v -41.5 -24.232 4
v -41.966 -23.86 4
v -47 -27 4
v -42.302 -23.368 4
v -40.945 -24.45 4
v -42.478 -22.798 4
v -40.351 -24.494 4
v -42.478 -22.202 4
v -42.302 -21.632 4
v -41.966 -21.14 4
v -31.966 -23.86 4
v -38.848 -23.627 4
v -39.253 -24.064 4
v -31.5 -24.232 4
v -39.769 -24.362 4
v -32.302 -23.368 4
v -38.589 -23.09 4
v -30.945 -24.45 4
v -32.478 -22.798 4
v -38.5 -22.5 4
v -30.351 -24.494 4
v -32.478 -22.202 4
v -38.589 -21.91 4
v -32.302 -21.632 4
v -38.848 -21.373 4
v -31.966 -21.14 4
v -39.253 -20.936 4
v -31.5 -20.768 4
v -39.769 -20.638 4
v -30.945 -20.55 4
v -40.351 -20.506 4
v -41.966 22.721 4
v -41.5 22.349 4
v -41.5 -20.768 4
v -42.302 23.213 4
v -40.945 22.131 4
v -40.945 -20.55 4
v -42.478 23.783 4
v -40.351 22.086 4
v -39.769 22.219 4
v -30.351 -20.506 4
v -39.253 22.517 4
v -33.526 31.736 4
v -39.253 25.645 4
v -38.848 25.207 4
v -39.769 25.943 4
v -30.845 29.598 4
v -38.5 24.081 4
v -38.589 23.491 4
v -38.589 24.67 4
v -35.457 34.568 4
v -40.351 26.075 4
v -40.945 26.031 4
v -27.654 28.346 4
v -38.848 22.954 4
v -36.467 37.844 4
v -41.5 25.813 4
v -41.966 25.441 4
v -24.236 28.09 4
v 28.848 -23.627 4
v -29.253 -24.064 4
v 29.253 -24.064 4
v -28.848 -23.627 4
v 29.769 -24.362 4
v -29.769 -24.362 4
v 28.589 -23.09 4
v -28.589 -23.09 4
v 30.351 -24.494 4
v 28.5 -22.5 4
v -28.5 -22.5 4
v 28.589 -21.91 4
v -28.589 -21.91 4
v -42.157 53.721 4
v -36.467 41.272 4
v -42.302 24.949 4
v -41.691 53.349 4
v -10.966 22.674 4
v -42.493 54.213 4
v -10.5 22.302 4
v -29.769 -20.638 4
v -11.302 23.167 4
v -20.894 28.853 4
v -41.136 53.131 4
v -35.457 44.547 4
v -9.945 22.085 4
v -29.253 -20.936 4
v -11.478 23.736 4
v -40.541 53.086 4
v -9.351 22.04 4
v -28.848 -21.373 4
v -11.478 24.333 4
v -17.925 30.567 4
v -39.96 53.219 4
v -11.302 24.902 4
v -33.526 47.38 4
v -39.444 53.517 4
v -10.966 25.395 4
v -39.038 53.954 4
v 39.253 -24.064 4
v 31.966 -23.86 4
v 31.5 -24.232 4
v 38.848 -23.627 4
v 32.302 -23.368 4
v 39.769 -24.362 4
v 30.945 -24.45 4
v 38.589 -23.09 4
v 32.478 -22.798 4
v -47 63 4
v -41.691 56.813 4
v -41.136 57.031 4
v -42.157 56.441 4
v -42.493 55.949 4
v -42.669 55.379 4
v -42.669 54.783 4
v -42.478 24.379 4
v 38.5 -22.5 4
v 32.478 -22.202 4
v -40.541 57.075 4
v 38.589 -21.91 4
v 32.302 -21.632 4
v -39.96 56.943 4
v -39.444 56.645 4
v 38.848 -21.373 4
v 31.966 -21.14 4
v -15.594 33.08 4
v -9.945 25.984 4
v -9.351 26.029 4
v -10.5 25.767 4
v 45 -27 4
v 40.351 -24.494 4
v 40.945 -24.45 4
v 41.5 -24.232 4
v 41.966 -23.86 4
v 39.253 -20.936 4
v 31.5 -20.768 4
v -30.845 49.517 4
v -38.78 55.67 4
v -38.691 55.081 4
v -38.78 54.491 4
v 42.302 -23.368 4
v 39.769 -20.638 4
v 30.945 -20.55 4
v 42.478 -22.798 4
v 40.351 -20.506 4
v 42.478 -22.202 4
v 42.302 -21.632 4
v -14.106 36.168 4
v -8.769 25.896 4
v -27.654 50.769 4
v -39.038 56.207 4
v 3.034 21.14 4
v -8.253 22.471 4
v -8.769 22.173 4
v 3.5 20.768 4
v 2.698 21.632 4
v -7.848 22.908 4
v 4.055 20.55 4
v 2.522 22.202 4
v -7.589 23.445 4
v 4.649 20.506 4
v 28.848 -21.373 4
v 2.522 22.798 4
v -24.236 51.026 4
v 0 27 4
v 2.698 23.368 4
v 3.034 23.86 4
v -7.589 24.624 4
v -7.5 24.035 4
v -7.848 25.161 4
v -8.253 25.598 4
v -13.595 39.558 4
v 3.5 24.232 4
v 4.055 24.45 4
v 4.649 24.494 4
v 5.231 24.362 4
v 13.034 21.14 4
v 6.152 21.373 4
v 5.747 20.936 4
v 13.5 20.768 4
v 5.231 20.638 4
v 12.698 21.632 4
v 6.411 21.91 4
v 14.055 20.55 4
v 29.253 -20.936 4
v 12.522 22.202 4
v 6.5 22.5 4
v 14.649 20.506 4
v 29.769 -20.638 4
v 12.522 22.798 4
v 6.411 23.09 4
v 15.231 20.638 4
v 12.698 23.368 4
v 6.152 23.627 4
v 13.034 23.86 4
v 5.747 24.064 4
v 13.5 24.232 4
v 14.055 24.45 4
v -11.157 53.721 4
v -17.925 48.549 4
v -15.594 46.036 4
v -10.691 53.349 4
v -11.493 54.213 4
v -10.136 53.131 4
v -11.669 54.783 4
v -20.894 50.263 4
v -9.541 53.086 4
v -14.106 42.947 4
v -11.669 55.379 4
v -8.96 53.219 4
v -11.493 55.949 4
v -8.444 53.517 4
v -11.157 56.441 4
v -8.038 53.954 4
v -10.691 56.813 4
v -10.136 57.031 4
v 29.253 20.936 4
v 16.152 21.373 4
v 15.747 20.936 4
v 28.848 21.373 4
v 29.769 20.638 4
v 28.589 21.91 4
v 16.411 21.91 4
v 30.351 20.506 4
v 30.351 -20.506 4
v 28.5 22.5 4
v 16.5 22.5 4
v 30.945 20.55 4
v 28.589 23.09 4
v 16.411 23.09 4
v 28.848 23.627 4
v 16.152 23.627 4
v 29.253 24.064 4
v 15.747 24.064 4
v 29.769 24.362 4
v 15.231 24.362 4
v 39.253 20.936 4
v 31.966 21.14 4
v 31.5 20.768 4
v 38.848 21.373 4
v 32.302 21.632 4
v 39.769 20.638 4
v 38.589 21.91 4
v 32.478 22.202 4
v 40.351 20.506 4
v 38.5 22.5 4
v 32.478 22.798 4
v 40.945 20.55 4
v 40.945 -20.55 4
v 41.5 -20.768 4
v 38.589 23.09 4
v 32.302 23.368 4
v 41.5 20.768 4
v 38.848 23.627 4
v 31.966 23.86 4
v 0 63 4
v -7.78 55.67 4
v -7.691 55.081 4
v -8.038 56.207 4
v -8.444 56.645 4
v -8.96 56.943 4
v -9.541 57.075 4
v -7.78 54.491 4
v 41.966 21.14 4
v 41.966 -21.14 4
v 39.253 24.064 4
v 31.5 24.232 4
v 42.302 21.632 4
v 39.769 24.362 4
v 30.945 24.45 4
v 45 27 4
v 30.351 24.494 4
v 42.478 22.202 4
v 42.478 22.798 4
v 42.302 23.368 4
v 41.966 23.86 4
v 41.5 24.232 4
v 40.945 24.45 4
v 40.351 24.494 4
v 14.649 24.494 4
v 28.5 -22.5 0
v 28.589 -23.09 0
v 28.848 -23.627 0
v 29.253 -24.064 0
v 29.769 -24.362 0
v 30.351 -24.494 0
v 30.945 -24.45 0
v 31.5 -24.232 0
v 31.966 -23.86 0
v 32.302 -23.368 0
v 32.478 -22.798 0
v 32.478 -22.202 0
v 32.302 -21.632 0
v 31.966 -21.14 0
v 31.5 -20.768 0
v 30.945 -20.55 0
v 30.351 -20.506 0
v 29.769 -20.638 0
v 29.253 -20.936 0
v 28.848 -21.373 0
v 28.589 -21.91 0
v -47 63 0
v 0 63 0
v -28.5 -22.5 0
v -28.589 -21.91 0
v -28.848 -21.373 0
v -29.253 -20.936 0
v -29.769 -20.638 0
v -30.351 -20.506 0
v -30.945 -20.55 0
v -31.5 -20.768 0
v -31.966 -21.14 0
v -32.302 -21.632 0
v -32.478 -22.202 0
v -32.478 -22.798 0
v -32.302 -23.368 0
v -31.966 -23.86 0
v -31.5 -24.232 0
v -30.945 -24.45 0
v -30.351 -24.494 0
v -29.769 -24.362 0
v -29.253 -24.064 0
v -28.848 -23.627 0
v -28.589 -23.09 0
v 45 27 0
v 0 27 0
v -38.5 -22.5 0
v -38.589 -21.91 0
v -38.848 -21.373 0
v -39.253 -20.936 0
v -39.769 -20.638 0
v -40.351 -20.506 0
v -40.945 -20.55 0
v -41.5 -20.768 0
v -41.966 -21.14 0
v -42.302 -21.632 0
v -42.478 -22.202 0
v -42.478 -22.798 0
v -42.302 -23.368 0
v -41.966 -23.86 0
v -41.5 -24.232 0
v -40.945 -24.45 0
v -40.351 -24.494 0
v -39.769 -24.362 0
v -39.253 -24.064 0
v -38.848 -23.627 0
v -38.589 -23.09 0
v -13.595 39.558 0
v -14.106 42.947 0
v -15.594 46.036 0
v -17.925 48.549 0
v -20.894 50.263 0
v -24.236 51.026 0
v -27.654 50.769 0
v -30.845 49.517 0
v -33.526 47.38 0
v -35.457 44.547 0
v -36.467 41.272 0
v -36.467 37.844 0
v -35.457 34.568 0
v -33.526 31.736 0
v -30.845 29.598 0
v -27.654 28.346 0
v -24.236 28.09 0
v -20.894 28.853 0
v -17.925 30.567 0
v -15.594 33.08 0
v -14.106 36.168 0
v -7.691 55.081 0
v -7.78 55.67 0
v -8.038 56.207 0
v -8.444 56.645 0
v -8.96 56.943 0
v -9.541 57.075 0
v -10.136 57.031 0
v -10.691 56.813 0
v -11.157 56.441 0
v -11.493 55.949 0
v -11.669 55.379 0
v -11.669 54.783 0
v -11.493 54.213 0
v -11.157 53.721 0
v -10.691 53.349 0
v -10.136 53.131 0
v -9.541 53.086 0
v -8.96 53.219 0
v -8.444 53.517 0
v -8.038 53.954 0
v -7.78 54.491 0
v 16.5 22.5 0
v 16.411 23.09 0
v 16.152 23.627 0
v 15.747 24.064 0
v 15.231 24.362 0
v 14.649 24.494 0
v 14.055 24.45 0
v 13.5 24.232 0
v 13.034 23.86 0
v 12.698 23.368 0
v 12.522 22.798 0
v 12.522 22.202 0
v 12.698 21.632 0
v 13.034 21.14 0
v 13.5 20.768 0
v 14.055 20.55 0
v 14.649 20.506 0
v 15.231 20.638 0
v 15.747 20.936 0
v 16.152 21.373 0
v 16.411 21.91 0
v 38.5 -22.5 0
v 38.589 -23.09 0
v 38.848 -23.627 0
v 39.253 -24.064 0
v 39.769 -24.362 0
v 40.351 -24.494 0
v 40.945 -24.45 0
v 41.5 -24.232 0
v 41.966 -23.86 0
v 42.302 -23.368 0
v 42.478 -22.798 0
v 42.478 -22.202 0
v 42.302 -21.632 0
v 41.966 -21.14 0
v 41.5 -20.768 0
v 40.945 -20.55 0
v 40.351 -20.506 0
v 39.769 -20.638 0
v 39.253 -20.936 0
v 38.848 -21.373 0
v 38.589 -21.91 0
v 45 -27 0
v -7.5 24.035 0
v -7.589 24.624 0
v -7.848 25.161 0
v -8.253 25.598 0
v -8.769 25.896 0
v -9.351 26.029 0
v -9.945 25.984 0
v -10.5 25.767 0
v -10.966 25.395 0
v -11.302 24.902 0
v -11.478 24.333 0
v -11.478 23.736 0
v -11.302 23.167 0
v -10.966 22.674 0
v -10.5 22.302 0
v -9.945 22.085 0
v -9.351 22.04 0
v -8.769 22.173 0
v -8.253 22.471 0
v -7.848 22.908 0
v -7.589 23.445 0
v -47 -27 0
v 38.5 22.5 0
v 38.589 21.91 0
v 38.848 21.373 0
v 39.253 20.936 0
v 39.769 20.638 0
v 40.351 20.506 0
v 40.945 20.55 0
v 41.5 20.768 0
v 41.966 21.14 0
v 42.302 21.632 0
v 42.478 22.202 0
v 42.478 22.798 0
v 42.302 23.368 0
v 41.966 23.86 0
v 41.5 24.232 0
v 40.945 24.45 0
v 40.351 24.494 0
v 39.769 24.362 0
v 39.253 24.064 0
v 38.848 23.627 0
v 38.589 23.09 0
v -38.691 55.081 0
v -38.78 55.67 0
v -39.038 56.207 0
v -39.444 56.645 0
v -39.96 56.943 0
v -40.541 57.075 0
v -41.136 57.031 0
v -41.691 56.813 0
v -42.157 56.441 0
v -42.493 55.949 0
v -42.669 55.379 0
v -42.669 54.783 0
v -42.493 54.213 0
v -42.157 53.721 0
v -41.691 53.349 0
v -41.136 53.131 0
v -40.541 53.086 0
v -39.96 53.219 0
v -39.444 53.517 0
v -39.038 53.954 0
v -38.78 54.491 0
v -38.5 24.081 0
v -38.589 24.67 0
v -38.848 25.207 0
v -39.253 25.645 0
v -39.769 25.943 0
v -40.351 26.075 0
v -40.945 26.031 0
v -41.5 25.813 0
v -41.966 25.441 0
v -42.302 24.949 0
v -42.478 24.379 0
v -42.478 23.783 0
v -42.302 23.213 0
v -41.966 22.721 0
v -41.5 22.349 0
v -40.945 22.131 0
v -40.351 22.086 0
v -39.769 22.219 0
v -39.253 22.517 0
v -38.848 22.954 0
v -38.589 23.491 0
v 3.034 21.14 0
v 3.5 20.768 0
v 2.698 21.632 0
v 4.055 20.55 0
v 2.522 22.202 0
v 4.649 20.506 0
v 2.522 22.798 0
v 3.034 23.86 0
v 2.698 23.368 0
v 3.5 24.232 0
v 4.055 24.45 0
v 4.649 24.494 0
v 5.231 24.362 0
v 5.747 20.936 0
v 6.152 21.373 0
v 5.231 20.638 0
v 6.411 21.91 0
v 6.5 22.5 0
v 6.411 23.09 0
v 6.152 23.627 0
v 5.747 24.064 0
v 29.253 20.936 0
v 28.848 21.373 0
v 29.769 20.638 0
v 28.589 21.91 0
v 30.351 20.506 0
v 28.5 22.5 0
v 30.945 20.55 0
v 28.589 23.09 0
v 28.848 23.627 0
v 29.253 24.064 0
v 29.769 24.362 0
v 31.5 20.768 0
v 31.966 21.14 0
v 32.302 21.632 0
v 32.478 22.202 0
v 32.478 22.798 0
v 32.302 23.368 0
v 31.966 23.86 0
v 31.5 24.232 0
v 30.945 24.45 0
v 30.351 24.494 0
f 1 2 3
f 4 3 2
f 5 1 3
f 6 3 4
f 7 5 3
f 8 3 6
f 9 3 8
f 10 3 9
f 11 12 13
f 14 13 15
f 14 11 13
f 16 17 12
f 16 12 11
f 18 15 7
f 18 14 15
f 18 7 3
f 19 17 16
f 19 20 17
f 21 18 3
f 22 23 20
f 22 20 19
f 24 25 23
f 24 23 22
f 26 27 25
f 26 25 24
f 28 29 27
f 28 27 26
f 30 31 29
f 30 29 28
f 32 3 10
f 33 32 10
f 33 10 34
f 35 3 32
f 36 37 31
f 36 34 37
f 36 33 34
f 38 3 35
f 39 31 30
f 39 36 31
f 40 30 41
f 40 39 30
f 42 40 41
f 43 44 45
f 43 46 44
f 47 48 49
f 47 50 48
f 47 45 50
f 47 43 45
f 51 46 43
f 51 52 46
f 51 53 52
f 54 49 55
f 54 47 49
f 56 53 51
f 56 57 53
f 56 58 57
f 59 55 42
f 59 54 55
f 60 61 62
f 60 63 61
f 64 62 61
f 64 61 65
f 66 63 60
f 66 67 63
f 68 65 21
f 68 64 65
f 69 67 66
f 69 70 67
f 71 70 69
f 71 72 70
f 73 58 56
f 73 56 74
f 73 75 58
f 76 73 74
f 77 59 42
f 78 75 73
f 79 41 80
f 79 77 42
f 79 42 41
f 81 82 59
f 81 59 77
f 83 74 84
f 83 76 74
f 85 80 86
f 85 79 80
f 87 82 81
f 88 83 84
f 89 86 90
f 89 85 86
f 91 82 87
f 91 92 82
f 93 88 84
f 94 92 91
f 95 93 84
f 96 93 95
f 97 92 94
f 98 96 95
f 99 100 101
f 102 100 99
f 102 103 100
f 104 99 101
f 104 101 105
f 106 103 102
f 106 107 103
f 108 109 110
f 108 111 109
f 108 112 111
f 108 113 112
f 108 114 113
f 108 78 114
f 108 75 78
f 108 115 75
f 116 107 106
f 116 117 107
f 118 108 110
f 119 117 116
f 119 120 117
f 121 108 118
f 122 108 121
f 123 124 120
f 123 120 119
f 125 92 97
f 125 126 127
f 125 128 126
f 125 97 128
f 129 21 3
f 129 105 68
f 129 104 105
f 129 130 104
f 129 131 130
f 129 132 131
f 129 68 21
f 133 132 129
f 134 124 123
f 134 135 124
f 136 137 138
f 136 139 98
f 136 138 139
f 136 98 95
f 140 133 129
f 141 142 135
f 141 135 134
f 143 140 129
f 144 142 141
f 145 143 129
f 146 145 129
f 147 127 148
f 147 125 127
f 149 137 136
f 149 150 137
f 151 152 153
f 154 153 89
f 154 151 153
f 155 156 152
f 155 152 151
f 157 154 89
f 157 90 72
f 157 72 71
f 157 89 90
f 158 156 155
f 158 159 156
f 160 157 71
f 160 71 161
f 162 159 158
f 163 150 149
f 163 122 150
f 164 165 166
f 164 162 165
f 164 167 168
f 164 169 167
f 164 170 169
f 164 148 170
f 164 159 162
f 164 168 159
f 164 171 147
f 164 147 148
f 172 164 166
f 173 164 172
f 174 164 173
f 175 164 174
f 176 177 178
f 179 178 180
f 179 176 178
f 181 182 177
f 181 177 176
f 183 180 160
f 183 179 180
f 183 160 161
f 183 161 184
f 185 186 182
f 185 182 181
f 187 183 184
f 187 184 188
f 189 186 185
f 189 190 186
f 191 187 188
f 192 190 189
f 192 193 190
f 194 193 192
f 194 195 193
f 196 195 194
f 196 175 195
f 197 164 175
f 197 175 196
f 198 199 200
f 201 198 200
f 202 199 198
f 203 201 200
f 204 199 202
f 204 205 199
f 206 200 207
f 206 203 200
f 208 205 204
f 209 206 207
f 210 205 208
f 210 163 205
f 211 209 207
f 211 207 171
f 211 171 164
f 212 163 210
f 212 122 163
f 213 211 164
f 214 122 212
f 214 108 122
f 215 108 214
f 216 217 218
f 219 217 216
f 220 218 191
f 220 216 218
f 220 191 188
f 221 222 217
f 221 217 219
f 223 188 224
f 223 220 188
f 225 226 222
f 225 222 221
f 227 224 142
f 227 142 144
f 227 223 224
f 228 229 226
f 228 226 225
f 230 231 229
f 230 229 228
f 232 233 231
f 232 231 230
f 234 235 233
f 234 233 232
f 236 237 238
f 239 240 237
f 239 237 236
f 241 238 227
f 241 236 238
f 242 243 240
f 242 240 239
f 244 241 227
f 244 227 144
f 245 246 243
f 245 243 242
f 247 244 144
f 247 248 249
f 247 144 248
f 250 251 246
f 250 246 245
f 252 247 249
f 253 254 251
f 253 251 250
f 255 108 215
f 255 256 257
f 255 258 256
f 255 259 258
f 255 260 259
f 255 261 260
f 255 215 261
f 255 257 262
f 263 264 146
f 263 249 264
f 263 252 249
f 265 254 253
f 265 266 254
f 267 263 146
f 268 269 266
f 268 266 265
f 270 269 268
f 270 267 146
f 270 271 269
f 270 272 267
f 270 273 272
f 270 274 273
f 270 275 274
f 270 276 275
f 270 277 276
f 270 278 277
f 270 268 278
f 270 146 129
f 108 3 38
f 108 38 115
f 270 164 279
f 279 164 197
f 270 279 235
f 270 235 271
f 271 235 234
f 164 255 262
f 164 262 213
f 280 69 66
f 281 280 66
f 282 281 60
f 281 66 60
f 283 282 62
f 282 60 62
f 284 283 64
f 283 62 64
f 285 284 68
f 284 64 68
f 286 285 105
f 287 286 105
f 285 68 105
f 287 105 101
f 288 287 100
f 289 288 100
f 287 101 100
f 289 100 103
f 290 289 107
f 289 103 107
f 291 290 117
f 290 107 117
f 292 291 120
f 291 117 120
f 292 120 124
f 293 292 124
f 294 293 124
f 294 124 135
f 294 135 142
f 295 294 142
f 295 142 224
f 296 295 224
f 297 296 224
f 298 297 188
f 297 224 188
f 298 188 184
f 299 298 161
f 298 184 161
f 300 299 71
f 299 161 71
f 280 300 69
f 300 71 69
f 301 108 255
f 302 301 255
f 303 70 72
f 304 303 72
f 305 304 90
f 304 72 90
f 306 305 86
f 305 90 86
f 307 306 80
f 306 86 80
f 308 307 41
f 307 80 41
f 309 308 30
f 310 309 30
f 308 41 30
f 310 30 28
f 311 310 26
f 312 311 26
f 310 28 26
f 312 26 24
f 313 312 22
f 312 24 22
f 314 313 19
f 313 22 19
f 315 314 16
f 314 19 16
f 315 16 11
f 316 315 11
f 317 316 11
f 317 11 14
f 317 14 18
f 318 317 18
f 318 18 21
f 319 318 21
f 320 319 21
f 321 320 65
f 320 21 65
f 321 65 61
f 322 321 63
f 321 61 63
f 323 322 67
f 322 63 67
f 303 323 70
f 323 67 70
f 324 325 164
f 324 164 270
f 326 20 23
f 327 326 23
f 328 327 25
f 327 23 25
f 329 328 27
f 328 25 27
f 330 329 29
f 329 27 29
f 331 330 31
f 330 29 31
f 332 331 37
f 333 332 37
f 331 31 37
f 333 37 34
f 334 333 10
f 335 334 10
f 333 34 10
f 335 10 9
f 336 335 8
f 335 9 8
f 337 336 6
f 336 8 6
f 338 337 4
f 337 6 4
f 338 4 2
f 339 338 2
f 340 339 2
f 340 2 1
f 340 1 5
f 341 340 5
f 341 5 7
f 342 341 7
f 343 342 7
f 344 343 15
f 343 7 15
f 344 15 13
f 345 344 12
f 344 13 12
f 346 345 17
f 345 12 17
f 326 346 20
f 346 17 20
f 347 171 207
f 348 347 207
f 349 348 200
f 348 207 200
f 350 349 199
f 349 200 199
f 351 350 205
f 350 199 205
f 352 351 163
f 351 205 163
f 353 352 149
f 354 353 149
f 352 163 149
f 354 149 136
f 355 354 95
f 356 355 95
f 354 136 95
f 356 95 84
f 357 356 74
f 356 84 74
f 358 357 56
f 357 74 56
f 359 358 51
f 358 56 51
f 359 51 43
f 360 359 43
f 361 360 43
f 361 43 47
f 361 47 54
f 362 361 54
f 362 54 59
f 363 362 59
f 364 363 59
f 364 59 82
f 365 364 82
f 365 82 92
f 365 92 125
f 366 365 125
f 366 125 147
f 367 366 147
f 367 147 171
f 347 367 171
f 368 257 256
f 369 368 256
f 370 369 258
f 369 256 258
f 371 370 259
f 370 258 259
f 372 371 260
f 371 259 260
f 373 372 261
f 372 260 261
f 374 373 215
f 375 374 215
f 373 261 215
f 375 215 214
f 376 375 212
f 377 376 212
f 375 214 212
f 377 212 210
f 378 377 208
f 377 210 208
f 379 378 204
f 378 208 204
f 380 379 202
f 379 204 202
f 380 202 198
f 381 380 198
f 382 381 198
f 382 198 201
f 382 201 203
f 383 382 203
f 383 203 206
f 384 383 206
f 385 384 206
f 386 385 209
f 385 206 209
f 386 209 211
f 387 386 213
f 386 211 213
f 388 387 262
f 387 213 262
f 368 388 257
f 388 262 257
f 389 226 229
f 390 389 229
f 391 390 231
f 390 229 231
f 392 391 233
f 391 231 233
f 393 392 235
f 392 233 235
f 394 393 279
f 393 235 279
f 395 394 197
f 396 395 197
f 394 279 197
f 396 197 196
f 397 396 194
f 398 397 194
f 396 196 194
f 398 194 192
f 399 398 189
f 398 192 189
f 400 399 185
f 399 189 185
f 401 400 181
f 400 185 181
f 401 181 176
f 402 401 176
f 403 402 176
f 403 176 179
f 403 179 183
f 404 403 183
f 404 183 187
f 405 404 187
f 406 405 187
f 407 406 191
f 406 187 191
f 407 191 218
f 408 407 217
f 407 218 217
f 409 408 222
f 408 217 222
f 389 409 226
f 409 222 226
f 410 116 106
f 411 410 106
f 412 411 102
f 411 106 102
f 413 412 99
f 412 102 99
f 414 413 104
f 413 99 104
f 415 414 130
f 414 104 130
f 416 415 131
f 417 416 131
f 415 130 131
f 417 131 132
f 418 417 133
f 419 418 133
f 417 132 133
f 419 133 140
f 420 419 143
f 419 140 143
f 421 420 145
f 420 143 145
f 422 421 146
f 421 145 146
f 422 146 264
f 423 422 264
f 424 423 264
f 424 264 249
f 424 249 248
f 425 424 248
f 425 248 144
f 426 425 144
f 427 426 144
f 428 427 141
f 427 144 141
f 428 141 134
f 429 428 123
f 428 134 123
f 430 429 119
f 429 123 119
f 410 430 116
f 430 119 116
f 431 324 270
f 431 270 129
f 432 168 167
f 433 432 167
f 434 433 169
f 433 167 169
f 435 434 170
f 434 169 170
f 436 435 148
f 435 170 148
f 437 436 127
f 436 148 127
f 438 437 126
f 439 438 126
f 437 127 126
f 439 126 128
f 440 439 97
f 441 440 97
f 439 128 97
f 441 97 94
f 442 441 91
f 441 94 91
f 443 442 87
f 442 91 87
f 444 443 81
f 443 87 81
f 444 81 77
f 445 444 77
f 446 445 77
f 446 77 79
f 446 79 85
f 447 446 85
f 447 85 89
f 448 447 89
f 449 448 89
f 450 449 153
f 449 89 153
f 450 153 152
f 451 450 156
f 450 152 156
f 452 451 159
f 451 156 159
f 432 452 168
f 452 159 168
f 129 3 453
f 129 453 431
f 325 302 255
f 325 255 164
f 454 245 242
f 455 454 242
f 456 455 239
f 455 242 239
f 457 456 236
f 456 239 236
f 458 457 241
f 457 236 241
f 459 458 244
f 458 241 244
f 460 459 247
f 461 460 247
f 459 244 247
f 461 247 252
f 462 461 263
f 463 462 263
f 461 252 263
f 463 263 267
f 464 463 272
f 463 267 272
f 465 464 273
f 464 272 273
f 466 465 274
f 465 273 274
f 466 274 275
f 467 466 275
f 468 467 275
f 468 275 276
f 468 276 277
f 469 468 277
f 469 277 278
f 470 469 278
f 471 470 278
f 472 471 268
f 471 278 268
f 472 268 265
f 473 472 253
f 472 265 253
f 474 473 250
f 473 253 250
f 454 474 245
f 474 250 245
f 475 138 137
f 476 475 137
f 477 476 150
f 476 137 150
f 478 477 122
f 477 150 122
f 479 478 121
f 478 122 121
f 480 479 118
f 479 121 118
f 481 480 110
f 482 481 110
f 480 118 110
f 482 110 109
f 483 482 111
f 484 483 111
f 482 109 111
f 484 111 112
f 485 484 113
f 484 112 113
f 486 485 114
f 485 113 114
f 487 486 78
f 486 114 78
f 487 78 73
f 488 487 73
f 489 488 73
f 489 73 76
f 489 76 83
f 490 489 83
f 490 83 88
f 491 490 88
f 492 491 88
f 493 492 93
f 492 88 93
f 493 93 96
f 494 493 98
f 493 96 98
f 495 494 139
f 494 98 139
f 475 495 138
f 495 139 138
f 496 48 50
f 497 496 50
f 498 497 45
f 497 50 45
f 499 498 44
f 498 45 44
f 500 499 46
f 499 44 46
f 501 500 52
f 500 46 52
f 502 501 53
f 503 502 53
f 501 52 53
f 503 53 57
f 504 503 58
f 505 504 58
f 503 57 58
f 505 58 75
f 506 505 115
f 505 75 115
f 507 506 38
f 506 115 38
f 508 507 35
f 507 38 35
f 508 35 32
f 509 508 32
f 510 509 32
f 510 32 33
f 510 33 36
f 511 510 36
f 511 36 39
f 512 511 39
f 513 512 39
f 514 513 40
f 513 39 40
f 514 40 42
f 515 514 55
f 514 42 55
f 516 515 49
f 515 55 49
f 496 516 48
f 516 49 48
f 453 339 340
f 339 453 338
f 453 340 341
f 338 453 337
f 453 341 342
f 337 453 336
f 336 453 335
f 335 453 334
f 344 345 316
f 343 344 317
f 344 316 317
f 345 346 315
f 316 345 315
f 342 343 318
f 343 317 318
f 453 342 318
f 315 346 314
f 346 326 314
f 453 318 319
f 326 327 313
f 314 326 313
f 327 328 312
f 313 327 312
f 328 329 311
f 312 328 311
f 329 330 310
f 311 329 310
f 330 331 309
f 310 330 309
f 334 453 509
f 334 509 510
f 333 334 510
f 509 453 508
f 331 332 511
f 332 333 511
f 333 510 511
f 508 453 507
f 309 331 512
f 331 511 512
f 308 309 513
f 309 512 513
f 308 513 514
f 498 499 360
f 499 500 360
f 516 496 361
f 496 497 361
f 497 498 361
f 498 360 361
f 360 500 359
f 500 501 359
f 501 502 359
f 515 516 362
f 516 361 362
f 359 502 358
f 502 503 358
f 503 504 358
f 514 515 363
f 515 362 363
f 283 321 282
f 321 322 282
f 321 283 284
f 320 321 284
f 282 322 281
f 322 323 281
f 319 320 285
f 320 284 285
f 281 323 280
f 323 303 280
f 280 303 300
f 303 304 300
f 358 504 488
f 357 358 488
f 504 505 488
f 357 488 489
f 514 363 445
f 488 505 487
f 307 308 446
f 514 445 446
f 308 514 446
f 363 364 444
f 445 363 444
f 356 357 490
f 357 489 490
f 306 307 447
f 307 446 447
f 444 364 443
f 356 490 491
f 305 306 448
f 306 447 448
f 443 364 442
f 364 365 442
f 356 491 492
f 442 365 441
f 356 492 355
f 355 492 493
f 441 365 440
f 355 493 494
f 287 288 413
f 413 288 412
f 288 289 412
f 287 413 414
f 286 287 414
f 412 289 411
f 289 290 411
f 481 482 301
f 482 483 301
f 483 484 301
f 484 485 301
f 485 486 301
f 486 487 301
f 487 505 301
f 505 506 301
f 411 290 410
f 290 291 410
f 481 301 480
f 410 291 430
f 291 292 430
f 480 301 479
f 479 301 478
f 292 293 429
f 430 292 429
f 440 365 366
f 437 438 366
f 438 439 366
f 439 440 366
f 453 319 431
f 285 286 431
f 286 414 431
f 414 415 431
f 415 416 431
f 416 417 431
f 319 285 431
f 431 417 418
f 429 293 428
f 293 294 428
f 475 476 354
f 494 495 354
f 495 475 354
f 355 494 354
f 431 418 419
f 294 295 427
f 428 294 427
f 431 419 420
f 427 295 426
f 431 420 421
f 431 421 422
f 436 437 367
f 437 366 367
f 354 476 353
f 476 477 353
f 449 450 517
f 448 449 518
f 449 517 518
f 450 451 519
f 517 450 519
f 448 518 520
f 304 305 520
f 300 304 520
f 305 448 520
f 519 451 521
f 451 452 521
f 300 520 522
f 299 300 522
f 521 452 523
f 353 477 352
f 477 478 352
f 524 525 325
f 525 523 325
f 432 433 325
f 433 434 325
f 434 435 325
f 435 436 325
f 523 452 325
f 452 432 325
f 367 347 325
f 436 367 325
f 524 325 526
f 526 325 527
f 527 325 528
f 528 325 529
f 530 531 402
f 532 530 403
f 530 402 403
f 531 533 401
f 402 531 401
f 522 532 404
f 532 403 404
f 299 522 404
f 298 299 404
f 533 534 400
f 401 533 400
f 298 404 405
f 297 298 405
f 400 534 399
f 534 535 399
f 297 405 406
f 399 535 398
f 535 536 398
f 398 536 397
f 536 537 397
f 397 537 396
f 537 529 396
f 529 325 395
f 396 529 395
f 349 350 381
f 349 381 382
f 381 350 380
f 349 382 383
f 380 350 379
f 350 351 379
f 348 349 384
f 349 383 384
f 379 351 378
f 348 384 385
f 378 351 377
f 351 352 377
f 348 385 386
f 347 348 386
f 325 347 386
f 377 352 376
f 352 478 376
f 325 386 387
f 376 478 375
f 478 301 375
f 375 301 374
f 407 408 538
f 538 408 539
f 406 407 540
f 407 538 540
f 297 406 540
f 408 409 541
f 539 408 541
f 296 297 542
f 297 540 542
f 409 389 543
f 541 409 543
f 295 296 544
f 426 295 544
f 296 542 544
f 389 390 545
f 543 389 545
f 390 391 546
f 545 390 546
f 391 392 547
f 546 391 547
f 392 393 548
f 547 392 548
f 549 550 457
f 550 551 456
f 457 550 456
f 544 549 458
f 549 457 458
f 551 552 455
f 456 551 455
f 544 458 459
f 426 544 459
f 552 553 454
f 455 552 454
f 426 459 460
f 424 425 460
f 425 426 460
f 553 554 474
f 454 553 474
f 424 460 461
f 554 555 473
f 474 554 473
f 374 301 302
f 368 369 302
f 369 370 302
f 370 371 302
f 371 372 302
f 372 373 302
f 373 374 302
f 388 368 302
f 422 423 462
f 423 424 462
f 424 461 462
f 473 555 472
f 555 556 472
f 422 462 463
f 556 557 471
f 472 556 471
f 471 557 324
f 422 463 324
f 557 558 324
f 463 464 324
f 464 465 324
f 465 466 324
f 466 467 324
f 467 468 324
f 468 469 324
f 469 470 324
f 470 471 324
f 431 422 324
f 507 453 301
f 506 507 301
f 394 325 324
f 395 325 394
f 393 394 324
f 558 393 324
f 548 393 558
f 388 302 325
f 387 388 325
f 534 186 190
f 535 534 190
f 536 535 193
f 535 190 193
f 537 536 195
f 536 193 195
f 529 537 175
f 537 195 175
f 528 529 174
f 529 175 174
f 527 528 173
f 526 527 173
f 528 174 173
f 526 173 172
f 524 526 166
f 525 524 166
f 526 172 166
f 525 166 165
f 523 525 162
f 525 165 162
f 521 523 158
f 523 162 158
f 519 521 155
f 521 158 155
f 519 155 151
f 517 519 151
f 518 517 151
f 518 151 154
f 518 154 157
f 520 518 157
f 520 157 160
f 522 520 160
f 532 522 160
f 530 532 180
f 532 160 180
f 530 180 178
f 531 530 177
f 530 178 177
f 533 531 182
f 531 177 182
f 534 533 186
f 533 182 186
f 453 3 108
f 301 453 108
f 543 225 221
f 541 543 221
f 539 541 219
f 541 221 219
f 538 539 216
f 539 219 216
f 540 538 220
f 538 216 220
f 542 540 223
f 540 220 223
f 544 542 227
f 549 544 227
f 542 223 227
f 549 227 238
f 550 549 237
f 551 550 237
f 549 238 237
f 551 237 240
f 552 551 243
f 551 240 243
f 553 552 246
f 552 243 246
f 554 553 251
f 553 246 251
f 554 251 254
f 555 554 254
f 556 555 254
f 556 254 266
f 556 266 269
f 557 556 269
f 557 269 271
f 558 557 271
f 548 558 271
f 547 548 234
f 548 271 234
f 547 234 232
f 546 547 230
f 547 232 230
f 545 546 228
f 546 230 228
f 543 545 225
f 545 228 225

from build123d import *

# Parameters (mm, degrees)
BOSS_EXTRUDE1_DEPTH = 4
SKETCH2_R           = 2
CUT_EXTRUDE1_DEPTH  = 4
SKETCH3_R           = 2
CUT_EXTRUDE2_DEPTH  = 4
SKETCH4_R           = 2
CUT_EXTRUDE3_DEPTH  = 4
SKETCH5_W           = 2
SKETCH5_H           = 90
BOSS_EXTRUDE2_DEPTH = 4
SKETCH6_R           = 2
CUT_EXTRUDE4_DEPTH  = 4
SKETCH7_R           = 11.5
CUT_EXTRUDE5_DEPTH  = 10


with BuildPart() as part:
    # Sketch1 → Boss-Extrude1 (new body)
    with BuildSketch(Plane.XY):
        Polygon((-45, 27), (-45, 63), (0, 63), (0, 27), (45, 27), (45, -27), (-45, -27), align=None)
    extrude(amount=BOSS_EXTRUDE1_DEPTH)

    # Sketch2 → Cut-Extrude1 (cut)
    with BuildSketch(Plane.XY.offset(4)):
        with Locations((-40.5, -22.5)):
            Circle(SKETCH2_R)
        with Locations((-30.5, -22.5)):
            Circle(SKETCH2_R)
        with Locations(Location((30.5, -22.5, 0), (0, 0, 180))):
            Circle(SKETCH2_R)
        with Locations(Location((40.5, -22.5, 0), (0, 0, 180))):
            Circle(SKETCH2_R)
        with Locations(Location((30.5, 22.5, 0), (0, 0, 180))):
            Circle(SKETCH2_R)
        with Locations(Location((40.5, 22.5, 0), (0, 0, 180))):
            Circle(SKETCH2_R)
    extrude(amount=-CUT_EXTRUDE1_DEPTH, mode=Mode.SUBTRACT)

    # Sketch3 → Cut-Extrude2 (cut)
    with BuildSketch(Plane.XY.offset(4)):
        with Locations((-40.5, 24.080850084)):
            Circle(SKETCH3_R)
        with Locations((-9.500034607, 24.034529107)):
            Circle(SKETCH3_R)
    extrude(amount=-CUT_EXTRUDE2_DEPTH, mode=Mode.SUBTRACT)

    # Sketch4 → Cut-Extrude3 (cut)
    with BuildSketch(Plane.XY.offset(4)):
        with Locations((-40.690838772, 55.080850084)):
            Circle(SKETCH4_R)
        with Locations((-9.690838772, 55.080850084)):
            Circle(SKETCH4_R)
    extrude(amount=-CUT_EXTRUDE3_DEPTH, mode=Mode.SUBTRACT)

    # Sketch5 → Boss-Extrude2 (add)
    with BuildSketch(Plane.XY.offset(4)):
        with Locations((-46, 18)):
            Rectangle(SKETCH5_W, SKETCH5_H)
    extrude(amount=-BOSS_EXTRUDE2_DEPTH)

    # Sketch6 → Cut-Extrude4 (cut)
    with BuildSketch(Plane.XY.offset(4)):
        with Locations((4.5, 22.5)):
            Circle(SKETCH6_R)
        with Locations((14.5, 22.5)):
            Circle(SKETCH6_R)
    extrude(amount=-CUT_EXTRUDE4_DEPTH, mode=Mode.SUBTRACT)

    # Sketch7 → Cut-Extrude5 (cut)
    with BuildSketch(Plane.XY.offset(4)):
        with Locations((-25.09543669, 39.557689595)):
            Circle(SKETCH7_R)
    extrude(amount=-CUT_EXTRUDE5_DEPTH, mode=Mode.SUBTRACT)


solid = part.part
